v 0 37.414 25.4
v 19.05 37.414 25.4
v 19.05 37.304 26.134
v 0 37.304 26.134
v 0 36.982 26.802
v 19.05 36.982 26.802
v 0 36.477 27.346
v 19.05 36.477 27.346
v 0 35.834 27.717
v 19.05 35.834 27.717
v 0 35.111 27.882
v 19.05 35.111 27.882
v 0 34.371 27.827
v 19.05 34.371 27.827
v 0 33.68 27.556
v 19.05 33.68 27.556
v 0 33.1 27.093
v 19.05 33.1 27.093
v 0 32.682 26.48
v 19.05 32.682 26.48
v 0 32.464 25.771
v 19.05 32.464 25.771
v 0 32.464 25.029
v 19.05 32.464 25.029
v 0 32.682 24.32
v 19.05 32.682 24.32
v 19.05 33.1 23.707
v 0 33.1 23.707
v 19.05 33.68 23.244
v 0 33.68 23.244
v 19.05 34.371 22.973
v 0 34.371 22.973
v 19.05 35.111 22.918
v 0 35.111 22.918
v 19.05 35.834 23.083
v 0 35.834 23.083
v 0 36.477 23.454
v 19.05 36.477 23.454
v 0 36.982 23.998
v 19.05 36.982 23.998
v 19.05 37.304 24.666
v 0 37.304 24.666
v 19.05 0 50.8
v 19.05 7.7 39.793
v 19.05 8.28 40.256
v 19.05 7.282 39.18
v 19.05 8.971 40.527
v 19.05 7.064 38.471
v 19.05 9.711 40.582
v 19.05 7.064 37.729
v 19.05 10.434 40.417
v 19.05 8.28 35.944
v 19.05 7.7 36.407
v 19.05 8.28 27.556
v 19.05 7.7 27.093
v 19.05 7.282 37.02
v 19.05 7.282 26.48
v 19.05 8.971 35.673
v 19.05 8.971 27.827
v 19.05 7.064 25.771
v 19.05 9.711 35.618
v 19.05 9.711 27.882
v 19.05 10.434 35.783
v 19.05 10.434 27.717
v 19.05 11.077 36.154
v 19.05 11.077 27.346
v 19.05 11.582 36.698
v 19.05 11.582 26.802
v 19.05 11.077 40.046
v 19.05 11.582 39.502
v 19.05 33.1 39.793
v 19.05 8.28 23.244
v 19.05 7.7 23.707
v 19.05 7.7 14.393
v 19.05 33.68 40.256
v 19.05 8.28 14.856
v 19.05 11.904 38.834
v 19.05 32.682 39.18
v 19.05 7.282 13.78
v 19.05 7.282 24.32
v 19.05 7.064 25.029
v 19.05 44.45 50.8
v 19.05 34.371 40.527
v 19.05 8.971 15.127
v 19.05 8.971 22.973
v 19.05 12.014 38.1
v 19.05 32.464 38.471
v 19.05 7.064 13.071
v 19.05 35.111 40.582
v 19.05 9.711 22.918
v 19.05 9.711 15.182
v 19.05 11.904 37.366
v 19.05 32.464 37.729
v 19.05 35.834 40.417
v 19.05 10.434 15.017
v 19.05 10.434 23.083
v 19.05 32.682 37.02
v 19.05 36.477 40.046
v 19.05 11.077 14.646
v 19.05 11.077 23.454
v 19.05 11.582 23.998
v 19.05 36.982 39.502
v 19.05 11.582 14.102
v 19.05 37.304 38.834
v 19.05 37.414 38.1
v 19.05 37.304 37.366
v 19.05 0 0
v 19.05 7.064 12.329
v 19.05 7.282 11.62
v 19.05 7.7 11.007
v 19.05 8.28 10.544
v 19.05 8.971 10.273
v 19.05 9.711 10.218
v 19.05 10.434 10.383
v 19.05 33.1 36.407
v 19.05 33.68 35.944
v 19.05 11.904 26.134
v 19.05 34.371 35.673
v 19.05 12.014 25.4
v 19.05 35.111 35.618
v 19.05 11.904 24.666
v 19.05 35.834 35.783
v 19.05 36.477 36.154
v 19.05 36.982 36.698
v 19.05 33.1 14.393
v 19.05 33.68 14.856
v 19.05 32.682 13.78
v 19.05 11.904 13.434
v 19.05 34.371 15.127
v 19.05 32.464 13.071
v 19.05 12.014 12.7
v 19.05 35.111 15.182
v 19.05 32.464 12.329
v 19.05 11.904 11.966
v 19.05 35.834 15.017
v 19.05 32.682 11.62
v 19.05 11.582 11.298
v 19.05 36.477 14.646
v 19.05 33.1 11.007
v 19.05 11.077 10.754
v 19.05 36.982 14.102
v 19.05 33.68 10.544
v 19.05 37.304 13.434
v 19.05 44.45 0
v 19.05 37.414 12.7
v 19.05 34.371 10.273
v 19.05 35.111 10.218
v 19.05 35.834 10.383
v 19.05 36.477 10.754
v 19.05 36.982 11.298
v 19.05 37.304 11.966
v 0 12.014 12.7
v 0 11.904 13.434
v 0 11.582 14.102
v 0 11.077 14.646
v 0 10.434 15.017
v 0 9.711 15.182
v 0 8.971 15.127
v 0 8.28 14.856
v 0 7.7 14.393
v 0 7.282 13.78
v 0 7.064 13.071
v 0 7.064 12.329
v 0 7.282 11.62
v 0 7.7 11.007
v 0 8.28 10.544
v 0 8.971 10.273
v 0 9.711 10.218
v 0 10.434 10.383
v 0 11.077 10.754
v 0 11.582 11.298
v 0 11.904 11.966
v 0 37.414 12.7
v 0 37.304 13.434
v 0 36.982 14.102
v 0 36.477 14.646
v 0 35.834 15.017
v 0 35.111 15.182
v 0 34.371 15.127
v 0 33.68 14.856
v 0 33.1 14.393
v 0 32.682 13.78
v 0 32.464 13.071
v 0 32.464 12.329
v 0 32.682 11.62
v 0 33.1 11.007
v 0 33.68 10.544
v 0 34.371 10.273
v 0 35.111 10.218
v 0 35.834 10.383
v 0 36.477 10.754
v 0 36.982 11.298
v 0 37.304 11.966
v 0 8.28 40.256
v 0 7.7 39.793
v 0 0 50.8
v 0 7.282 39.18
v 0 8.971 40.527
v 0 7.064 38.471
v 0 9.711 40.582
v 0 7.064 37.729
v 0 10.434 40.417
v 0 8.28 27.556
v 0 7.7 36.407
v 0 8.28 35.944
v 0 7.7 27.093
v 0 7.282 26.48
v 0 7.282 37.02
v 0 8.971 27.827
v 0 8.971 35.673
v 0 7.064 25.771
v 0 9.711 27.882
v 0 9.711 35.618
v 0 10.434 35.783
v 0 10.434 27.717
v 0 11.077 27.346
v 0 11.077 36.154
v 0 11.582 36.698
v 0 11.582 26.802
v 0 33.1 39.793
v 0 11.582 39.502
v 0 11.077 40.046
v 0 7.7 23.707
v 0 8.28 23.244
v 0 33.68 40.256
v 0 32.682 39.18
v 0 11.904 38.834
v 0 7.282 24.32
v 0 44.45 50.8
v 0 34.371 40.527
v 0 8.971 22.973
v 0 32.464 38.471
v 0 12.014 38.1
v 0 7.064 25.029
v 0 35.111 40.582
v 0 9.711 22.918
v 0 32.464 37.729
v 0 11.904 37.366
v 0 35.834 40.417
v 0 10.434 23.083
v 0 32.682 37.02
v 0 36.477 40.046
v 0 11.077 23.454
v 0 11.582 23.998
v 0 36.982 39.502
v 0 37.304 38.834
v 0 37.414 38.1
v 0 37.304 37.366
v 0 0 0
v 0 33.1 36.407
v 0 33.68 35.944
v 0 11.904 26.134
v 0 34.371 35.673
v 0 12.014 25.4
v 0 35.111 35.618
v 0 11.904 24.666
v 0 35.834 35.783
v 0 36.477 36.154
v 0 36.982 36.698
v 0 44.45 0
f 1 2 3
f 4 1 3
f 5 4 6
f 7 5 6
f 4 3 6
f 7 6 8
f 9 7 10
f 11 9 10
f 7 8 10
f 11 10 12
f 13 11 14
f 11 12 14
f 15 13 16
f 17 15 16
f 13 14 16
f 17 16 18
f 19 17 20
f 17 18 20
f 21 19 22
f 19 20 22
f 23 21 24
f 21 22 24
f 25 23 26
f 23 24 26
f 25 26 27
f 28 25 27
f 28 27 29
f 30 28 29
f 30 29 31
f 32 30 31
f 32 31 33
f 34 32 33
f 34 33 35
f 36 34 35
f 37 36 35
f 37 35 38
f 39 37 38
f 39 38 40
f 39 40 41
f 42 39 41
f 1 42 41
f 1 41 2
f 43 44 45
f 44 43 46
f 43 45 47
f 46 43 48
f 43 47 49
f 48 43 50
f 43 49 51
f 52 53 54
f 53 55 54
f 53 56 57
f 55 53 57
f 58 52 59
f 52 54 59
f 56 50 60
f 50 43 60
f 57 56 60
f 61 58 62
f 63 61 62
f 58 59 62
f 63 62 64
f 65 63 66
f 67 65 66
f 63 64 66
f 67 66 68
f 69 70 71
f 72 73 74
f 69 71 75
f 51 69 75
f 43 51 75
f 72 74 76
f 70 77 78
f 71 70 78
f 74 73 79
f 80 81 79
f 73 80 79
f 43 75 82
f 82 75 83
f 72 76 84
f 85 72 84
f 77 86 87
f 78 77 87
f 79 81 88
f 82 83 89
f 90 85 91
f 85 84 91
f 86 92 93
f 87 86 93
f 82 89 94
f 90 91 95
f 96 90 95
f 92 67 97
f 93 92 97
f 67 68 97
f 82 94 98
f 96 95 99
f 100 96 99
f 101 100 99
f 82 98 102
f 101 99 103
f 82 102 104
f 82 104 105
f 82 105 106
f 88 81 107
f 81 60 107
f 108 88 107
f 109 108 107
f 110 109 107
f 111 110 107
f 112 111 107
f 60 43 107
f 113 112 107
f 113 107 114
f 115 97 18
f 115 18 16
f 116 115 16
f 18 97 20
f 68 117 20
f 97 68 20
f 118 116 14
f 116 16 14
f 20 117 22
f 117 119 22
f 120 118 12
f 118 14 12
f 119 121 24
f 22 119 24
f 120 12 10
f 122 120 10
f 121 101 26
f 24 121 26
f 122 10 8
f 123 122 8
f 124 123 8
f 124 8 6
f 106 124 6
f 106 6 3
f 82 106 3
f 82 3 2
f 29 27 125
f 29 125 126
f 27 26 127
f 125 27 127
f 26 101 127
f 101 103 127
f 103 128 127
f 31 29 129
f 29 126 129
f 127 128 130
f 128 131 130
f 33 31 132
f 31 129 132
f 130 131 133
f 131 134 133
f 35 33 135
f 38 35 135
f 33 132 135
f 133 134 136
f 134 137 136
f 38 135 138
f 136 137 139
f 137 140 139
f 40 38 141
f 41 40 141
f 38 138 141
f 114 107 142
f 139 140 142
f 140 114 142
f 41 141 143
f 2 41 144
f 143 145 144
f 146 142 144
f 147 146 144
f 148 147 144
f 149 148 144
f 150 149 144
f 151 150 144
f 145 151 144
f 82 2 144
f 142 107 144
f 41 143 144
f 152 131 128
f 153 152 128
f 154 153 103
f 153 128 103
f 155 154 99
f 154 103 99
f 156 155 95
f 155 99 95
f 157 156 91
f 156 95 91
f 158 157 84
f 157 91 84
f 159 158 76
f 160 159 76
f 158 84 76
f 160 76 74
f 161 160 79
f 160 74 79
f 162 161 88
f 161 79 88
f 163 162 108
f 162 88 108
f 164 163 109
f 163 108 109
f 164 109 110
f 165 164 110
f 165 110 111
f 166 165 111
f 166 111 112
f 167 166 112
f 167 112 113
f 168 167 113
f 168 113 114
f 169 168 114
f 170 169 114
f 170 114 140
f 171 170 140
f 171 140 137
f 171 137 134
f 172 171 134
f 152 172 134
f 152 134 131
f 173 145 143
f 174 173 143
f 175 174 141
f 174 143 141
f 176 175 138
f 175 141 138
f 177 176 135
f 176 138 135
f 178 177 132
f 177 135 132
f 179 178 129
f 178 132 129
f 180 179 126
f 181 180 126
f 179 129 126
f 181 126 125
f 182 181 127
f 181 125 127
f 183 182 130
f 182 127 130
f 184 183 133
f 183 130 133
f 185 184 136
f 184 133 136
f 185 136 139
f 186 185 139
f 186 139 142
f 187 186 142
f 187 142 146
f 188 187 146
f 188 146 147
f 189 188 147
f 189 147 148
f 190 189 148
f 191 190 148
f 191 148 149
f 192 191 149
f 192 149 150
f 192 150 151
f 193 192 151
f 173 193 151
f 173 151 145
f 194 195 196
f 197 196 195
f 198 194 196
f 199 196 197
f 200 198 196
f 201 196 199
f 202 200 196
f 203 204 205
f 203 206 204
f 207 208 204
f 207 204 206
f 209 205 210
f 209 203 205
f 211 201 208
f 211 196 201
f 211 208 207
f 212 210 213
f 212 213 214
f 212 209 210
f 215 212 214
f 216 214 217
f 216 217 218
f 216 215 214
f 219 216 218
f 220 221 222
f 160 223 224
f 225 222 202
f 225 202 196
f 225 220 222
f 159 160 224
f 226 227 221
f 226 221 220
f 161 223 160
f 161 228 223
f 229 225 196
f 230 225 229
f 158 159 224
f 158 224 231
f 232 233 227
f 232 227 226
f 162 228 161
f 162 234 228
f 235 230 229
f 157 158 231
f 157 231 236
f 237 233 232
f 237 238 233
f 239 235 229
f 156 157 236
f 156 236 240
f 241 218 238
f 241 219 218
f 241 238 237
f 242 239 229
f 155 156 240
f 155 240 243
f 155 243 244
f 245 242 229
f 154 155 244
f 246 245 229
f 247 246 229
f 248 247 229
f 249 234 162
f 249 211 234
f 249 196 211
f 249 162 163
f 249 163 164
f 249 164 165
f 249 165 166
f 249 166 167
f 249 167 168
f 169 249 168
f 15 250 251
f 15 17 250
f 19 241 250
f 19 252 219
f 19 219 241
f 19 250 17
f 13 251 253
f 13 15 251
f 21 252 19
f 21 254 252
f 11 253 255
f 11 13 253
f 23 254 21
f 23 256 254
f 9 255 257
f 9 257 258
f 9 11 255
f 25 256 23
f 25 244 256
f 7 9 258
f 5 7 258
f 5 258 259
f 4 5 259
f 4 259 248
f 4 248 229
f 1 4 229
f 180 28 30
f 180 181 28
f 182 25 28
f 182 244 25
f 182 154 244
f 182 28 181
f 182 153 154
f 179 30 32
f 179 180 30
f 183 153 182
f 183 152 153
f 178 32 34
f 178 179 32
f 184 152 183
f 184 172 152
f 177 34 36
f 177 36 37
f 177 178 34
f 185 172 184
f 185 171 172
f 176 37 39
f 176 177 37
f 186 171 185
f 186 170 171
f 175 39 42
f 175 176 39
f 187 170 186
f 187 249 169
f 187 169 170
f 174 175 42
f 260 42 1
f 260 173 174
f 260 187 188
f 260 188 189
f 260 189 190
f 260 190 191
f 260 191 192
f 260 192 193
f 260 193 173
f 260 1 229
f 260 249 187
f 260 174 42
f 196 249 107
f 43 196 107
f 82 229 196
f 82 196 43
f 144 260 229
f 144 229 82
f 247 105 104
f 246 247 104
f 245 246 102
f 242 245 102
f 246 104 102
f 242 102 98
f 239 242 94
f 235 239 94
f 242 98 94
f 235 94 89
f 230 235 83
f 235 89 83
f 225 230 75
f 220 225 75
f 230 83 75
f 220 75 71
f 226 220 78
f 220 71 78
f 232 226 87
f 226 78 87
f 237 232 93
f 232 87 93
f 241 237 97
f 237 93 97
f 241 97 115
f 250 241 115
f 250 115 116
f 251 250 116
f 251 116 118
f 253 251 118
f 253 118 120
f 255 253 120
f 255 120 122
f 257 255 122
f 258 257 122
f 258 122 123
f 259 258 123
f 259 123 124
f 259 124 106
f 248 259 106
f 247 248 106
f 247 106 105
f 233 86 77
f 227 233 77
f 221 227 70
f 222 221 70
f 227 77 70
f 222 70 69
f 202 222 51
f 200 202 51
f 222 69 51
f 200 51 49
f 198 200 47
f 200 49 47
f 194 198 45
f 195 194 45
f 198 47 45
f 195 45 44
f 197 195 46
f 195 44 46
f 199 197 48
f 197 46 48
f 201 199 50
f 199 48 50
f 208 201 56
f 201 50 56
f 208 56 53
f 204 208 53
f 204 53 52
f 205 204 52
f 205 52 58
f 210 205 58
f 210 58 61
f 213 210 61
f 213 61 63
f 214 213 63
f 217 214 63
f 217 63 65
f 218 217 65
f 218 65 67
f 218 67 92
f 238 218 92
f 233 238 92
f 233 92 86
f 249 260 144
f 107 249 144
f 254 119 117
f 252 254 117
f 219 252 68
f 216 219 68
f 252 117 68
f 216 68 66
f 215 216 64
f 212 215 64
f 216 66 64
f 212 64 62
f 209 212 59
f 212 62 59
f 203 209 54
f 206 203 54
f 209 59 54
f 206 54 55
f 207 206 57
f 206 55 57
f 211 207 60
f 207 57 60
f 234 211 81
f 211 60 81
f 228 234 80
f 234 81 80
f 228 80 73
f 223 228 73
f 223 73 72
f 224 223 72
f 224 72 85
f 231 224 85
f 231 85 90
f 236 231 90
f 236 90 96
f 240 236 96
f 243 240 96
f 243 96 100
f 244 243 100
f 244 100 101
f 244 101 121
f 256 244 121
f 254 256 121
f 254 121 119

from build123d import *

# Parameters (mm, degrees)
SKETCH1_W           = 19.05
SKETCH1_H           = 44.45
BOSS_EXTRUDE1_DEPTH = 50.8
SKETCH2_R           = 2.4892
CUT_EXTRUDE1_DEPTH  = 71.138042459


with BuildPart() as part:
    # Sketch1 → Boss-Extrude1 (new body)
    with BuildSketch(Plane.XY):
        with Locations((9.525, 22.225)):
            Rectangle(SKETCH1_W, SKETCH1_H)
    extrude(amount=BOSS_EXTRUDE1_DEPTH)

    # Sketch2 → Cut-Extrude1 (cut, through all)
    with BuildSketch(Plane(origin=(19.05, 0, 0), x_dir=(0, 0, -1), z_dir=(1, 0, 0))):
        with Locations(Location((-38.1, 9.525, 0), (0, 0, 90))):
            Circle(SKETCH2_R)
        with Locations(Location((-25.4, 9.525, 0), (0, 0, 90))):
            Circle(SKETCH2_R)
        with Locations(Location((-12.7, 9.525, 0), (0, 0, 90))):
            Circle(SKETCH2_R)
        with Locations(Location((-38.1, 34.925, 0), (0, 0, 90))):
            Circle(SKETCH2_R)
        with Locations(Location((-25.4, 34.925, 0), (0, 0, 90))):
            Circle(SKETCH2_R)
        with Locations(Location((-12.7, 34.925, 0), (0, 0, 90))):
            Circle(SKETCH2_R)
    extrude(amount=-CUT_EXTRUDE1_DEPTH, mode=Mode.SUBTRACT)


solid = part.part
